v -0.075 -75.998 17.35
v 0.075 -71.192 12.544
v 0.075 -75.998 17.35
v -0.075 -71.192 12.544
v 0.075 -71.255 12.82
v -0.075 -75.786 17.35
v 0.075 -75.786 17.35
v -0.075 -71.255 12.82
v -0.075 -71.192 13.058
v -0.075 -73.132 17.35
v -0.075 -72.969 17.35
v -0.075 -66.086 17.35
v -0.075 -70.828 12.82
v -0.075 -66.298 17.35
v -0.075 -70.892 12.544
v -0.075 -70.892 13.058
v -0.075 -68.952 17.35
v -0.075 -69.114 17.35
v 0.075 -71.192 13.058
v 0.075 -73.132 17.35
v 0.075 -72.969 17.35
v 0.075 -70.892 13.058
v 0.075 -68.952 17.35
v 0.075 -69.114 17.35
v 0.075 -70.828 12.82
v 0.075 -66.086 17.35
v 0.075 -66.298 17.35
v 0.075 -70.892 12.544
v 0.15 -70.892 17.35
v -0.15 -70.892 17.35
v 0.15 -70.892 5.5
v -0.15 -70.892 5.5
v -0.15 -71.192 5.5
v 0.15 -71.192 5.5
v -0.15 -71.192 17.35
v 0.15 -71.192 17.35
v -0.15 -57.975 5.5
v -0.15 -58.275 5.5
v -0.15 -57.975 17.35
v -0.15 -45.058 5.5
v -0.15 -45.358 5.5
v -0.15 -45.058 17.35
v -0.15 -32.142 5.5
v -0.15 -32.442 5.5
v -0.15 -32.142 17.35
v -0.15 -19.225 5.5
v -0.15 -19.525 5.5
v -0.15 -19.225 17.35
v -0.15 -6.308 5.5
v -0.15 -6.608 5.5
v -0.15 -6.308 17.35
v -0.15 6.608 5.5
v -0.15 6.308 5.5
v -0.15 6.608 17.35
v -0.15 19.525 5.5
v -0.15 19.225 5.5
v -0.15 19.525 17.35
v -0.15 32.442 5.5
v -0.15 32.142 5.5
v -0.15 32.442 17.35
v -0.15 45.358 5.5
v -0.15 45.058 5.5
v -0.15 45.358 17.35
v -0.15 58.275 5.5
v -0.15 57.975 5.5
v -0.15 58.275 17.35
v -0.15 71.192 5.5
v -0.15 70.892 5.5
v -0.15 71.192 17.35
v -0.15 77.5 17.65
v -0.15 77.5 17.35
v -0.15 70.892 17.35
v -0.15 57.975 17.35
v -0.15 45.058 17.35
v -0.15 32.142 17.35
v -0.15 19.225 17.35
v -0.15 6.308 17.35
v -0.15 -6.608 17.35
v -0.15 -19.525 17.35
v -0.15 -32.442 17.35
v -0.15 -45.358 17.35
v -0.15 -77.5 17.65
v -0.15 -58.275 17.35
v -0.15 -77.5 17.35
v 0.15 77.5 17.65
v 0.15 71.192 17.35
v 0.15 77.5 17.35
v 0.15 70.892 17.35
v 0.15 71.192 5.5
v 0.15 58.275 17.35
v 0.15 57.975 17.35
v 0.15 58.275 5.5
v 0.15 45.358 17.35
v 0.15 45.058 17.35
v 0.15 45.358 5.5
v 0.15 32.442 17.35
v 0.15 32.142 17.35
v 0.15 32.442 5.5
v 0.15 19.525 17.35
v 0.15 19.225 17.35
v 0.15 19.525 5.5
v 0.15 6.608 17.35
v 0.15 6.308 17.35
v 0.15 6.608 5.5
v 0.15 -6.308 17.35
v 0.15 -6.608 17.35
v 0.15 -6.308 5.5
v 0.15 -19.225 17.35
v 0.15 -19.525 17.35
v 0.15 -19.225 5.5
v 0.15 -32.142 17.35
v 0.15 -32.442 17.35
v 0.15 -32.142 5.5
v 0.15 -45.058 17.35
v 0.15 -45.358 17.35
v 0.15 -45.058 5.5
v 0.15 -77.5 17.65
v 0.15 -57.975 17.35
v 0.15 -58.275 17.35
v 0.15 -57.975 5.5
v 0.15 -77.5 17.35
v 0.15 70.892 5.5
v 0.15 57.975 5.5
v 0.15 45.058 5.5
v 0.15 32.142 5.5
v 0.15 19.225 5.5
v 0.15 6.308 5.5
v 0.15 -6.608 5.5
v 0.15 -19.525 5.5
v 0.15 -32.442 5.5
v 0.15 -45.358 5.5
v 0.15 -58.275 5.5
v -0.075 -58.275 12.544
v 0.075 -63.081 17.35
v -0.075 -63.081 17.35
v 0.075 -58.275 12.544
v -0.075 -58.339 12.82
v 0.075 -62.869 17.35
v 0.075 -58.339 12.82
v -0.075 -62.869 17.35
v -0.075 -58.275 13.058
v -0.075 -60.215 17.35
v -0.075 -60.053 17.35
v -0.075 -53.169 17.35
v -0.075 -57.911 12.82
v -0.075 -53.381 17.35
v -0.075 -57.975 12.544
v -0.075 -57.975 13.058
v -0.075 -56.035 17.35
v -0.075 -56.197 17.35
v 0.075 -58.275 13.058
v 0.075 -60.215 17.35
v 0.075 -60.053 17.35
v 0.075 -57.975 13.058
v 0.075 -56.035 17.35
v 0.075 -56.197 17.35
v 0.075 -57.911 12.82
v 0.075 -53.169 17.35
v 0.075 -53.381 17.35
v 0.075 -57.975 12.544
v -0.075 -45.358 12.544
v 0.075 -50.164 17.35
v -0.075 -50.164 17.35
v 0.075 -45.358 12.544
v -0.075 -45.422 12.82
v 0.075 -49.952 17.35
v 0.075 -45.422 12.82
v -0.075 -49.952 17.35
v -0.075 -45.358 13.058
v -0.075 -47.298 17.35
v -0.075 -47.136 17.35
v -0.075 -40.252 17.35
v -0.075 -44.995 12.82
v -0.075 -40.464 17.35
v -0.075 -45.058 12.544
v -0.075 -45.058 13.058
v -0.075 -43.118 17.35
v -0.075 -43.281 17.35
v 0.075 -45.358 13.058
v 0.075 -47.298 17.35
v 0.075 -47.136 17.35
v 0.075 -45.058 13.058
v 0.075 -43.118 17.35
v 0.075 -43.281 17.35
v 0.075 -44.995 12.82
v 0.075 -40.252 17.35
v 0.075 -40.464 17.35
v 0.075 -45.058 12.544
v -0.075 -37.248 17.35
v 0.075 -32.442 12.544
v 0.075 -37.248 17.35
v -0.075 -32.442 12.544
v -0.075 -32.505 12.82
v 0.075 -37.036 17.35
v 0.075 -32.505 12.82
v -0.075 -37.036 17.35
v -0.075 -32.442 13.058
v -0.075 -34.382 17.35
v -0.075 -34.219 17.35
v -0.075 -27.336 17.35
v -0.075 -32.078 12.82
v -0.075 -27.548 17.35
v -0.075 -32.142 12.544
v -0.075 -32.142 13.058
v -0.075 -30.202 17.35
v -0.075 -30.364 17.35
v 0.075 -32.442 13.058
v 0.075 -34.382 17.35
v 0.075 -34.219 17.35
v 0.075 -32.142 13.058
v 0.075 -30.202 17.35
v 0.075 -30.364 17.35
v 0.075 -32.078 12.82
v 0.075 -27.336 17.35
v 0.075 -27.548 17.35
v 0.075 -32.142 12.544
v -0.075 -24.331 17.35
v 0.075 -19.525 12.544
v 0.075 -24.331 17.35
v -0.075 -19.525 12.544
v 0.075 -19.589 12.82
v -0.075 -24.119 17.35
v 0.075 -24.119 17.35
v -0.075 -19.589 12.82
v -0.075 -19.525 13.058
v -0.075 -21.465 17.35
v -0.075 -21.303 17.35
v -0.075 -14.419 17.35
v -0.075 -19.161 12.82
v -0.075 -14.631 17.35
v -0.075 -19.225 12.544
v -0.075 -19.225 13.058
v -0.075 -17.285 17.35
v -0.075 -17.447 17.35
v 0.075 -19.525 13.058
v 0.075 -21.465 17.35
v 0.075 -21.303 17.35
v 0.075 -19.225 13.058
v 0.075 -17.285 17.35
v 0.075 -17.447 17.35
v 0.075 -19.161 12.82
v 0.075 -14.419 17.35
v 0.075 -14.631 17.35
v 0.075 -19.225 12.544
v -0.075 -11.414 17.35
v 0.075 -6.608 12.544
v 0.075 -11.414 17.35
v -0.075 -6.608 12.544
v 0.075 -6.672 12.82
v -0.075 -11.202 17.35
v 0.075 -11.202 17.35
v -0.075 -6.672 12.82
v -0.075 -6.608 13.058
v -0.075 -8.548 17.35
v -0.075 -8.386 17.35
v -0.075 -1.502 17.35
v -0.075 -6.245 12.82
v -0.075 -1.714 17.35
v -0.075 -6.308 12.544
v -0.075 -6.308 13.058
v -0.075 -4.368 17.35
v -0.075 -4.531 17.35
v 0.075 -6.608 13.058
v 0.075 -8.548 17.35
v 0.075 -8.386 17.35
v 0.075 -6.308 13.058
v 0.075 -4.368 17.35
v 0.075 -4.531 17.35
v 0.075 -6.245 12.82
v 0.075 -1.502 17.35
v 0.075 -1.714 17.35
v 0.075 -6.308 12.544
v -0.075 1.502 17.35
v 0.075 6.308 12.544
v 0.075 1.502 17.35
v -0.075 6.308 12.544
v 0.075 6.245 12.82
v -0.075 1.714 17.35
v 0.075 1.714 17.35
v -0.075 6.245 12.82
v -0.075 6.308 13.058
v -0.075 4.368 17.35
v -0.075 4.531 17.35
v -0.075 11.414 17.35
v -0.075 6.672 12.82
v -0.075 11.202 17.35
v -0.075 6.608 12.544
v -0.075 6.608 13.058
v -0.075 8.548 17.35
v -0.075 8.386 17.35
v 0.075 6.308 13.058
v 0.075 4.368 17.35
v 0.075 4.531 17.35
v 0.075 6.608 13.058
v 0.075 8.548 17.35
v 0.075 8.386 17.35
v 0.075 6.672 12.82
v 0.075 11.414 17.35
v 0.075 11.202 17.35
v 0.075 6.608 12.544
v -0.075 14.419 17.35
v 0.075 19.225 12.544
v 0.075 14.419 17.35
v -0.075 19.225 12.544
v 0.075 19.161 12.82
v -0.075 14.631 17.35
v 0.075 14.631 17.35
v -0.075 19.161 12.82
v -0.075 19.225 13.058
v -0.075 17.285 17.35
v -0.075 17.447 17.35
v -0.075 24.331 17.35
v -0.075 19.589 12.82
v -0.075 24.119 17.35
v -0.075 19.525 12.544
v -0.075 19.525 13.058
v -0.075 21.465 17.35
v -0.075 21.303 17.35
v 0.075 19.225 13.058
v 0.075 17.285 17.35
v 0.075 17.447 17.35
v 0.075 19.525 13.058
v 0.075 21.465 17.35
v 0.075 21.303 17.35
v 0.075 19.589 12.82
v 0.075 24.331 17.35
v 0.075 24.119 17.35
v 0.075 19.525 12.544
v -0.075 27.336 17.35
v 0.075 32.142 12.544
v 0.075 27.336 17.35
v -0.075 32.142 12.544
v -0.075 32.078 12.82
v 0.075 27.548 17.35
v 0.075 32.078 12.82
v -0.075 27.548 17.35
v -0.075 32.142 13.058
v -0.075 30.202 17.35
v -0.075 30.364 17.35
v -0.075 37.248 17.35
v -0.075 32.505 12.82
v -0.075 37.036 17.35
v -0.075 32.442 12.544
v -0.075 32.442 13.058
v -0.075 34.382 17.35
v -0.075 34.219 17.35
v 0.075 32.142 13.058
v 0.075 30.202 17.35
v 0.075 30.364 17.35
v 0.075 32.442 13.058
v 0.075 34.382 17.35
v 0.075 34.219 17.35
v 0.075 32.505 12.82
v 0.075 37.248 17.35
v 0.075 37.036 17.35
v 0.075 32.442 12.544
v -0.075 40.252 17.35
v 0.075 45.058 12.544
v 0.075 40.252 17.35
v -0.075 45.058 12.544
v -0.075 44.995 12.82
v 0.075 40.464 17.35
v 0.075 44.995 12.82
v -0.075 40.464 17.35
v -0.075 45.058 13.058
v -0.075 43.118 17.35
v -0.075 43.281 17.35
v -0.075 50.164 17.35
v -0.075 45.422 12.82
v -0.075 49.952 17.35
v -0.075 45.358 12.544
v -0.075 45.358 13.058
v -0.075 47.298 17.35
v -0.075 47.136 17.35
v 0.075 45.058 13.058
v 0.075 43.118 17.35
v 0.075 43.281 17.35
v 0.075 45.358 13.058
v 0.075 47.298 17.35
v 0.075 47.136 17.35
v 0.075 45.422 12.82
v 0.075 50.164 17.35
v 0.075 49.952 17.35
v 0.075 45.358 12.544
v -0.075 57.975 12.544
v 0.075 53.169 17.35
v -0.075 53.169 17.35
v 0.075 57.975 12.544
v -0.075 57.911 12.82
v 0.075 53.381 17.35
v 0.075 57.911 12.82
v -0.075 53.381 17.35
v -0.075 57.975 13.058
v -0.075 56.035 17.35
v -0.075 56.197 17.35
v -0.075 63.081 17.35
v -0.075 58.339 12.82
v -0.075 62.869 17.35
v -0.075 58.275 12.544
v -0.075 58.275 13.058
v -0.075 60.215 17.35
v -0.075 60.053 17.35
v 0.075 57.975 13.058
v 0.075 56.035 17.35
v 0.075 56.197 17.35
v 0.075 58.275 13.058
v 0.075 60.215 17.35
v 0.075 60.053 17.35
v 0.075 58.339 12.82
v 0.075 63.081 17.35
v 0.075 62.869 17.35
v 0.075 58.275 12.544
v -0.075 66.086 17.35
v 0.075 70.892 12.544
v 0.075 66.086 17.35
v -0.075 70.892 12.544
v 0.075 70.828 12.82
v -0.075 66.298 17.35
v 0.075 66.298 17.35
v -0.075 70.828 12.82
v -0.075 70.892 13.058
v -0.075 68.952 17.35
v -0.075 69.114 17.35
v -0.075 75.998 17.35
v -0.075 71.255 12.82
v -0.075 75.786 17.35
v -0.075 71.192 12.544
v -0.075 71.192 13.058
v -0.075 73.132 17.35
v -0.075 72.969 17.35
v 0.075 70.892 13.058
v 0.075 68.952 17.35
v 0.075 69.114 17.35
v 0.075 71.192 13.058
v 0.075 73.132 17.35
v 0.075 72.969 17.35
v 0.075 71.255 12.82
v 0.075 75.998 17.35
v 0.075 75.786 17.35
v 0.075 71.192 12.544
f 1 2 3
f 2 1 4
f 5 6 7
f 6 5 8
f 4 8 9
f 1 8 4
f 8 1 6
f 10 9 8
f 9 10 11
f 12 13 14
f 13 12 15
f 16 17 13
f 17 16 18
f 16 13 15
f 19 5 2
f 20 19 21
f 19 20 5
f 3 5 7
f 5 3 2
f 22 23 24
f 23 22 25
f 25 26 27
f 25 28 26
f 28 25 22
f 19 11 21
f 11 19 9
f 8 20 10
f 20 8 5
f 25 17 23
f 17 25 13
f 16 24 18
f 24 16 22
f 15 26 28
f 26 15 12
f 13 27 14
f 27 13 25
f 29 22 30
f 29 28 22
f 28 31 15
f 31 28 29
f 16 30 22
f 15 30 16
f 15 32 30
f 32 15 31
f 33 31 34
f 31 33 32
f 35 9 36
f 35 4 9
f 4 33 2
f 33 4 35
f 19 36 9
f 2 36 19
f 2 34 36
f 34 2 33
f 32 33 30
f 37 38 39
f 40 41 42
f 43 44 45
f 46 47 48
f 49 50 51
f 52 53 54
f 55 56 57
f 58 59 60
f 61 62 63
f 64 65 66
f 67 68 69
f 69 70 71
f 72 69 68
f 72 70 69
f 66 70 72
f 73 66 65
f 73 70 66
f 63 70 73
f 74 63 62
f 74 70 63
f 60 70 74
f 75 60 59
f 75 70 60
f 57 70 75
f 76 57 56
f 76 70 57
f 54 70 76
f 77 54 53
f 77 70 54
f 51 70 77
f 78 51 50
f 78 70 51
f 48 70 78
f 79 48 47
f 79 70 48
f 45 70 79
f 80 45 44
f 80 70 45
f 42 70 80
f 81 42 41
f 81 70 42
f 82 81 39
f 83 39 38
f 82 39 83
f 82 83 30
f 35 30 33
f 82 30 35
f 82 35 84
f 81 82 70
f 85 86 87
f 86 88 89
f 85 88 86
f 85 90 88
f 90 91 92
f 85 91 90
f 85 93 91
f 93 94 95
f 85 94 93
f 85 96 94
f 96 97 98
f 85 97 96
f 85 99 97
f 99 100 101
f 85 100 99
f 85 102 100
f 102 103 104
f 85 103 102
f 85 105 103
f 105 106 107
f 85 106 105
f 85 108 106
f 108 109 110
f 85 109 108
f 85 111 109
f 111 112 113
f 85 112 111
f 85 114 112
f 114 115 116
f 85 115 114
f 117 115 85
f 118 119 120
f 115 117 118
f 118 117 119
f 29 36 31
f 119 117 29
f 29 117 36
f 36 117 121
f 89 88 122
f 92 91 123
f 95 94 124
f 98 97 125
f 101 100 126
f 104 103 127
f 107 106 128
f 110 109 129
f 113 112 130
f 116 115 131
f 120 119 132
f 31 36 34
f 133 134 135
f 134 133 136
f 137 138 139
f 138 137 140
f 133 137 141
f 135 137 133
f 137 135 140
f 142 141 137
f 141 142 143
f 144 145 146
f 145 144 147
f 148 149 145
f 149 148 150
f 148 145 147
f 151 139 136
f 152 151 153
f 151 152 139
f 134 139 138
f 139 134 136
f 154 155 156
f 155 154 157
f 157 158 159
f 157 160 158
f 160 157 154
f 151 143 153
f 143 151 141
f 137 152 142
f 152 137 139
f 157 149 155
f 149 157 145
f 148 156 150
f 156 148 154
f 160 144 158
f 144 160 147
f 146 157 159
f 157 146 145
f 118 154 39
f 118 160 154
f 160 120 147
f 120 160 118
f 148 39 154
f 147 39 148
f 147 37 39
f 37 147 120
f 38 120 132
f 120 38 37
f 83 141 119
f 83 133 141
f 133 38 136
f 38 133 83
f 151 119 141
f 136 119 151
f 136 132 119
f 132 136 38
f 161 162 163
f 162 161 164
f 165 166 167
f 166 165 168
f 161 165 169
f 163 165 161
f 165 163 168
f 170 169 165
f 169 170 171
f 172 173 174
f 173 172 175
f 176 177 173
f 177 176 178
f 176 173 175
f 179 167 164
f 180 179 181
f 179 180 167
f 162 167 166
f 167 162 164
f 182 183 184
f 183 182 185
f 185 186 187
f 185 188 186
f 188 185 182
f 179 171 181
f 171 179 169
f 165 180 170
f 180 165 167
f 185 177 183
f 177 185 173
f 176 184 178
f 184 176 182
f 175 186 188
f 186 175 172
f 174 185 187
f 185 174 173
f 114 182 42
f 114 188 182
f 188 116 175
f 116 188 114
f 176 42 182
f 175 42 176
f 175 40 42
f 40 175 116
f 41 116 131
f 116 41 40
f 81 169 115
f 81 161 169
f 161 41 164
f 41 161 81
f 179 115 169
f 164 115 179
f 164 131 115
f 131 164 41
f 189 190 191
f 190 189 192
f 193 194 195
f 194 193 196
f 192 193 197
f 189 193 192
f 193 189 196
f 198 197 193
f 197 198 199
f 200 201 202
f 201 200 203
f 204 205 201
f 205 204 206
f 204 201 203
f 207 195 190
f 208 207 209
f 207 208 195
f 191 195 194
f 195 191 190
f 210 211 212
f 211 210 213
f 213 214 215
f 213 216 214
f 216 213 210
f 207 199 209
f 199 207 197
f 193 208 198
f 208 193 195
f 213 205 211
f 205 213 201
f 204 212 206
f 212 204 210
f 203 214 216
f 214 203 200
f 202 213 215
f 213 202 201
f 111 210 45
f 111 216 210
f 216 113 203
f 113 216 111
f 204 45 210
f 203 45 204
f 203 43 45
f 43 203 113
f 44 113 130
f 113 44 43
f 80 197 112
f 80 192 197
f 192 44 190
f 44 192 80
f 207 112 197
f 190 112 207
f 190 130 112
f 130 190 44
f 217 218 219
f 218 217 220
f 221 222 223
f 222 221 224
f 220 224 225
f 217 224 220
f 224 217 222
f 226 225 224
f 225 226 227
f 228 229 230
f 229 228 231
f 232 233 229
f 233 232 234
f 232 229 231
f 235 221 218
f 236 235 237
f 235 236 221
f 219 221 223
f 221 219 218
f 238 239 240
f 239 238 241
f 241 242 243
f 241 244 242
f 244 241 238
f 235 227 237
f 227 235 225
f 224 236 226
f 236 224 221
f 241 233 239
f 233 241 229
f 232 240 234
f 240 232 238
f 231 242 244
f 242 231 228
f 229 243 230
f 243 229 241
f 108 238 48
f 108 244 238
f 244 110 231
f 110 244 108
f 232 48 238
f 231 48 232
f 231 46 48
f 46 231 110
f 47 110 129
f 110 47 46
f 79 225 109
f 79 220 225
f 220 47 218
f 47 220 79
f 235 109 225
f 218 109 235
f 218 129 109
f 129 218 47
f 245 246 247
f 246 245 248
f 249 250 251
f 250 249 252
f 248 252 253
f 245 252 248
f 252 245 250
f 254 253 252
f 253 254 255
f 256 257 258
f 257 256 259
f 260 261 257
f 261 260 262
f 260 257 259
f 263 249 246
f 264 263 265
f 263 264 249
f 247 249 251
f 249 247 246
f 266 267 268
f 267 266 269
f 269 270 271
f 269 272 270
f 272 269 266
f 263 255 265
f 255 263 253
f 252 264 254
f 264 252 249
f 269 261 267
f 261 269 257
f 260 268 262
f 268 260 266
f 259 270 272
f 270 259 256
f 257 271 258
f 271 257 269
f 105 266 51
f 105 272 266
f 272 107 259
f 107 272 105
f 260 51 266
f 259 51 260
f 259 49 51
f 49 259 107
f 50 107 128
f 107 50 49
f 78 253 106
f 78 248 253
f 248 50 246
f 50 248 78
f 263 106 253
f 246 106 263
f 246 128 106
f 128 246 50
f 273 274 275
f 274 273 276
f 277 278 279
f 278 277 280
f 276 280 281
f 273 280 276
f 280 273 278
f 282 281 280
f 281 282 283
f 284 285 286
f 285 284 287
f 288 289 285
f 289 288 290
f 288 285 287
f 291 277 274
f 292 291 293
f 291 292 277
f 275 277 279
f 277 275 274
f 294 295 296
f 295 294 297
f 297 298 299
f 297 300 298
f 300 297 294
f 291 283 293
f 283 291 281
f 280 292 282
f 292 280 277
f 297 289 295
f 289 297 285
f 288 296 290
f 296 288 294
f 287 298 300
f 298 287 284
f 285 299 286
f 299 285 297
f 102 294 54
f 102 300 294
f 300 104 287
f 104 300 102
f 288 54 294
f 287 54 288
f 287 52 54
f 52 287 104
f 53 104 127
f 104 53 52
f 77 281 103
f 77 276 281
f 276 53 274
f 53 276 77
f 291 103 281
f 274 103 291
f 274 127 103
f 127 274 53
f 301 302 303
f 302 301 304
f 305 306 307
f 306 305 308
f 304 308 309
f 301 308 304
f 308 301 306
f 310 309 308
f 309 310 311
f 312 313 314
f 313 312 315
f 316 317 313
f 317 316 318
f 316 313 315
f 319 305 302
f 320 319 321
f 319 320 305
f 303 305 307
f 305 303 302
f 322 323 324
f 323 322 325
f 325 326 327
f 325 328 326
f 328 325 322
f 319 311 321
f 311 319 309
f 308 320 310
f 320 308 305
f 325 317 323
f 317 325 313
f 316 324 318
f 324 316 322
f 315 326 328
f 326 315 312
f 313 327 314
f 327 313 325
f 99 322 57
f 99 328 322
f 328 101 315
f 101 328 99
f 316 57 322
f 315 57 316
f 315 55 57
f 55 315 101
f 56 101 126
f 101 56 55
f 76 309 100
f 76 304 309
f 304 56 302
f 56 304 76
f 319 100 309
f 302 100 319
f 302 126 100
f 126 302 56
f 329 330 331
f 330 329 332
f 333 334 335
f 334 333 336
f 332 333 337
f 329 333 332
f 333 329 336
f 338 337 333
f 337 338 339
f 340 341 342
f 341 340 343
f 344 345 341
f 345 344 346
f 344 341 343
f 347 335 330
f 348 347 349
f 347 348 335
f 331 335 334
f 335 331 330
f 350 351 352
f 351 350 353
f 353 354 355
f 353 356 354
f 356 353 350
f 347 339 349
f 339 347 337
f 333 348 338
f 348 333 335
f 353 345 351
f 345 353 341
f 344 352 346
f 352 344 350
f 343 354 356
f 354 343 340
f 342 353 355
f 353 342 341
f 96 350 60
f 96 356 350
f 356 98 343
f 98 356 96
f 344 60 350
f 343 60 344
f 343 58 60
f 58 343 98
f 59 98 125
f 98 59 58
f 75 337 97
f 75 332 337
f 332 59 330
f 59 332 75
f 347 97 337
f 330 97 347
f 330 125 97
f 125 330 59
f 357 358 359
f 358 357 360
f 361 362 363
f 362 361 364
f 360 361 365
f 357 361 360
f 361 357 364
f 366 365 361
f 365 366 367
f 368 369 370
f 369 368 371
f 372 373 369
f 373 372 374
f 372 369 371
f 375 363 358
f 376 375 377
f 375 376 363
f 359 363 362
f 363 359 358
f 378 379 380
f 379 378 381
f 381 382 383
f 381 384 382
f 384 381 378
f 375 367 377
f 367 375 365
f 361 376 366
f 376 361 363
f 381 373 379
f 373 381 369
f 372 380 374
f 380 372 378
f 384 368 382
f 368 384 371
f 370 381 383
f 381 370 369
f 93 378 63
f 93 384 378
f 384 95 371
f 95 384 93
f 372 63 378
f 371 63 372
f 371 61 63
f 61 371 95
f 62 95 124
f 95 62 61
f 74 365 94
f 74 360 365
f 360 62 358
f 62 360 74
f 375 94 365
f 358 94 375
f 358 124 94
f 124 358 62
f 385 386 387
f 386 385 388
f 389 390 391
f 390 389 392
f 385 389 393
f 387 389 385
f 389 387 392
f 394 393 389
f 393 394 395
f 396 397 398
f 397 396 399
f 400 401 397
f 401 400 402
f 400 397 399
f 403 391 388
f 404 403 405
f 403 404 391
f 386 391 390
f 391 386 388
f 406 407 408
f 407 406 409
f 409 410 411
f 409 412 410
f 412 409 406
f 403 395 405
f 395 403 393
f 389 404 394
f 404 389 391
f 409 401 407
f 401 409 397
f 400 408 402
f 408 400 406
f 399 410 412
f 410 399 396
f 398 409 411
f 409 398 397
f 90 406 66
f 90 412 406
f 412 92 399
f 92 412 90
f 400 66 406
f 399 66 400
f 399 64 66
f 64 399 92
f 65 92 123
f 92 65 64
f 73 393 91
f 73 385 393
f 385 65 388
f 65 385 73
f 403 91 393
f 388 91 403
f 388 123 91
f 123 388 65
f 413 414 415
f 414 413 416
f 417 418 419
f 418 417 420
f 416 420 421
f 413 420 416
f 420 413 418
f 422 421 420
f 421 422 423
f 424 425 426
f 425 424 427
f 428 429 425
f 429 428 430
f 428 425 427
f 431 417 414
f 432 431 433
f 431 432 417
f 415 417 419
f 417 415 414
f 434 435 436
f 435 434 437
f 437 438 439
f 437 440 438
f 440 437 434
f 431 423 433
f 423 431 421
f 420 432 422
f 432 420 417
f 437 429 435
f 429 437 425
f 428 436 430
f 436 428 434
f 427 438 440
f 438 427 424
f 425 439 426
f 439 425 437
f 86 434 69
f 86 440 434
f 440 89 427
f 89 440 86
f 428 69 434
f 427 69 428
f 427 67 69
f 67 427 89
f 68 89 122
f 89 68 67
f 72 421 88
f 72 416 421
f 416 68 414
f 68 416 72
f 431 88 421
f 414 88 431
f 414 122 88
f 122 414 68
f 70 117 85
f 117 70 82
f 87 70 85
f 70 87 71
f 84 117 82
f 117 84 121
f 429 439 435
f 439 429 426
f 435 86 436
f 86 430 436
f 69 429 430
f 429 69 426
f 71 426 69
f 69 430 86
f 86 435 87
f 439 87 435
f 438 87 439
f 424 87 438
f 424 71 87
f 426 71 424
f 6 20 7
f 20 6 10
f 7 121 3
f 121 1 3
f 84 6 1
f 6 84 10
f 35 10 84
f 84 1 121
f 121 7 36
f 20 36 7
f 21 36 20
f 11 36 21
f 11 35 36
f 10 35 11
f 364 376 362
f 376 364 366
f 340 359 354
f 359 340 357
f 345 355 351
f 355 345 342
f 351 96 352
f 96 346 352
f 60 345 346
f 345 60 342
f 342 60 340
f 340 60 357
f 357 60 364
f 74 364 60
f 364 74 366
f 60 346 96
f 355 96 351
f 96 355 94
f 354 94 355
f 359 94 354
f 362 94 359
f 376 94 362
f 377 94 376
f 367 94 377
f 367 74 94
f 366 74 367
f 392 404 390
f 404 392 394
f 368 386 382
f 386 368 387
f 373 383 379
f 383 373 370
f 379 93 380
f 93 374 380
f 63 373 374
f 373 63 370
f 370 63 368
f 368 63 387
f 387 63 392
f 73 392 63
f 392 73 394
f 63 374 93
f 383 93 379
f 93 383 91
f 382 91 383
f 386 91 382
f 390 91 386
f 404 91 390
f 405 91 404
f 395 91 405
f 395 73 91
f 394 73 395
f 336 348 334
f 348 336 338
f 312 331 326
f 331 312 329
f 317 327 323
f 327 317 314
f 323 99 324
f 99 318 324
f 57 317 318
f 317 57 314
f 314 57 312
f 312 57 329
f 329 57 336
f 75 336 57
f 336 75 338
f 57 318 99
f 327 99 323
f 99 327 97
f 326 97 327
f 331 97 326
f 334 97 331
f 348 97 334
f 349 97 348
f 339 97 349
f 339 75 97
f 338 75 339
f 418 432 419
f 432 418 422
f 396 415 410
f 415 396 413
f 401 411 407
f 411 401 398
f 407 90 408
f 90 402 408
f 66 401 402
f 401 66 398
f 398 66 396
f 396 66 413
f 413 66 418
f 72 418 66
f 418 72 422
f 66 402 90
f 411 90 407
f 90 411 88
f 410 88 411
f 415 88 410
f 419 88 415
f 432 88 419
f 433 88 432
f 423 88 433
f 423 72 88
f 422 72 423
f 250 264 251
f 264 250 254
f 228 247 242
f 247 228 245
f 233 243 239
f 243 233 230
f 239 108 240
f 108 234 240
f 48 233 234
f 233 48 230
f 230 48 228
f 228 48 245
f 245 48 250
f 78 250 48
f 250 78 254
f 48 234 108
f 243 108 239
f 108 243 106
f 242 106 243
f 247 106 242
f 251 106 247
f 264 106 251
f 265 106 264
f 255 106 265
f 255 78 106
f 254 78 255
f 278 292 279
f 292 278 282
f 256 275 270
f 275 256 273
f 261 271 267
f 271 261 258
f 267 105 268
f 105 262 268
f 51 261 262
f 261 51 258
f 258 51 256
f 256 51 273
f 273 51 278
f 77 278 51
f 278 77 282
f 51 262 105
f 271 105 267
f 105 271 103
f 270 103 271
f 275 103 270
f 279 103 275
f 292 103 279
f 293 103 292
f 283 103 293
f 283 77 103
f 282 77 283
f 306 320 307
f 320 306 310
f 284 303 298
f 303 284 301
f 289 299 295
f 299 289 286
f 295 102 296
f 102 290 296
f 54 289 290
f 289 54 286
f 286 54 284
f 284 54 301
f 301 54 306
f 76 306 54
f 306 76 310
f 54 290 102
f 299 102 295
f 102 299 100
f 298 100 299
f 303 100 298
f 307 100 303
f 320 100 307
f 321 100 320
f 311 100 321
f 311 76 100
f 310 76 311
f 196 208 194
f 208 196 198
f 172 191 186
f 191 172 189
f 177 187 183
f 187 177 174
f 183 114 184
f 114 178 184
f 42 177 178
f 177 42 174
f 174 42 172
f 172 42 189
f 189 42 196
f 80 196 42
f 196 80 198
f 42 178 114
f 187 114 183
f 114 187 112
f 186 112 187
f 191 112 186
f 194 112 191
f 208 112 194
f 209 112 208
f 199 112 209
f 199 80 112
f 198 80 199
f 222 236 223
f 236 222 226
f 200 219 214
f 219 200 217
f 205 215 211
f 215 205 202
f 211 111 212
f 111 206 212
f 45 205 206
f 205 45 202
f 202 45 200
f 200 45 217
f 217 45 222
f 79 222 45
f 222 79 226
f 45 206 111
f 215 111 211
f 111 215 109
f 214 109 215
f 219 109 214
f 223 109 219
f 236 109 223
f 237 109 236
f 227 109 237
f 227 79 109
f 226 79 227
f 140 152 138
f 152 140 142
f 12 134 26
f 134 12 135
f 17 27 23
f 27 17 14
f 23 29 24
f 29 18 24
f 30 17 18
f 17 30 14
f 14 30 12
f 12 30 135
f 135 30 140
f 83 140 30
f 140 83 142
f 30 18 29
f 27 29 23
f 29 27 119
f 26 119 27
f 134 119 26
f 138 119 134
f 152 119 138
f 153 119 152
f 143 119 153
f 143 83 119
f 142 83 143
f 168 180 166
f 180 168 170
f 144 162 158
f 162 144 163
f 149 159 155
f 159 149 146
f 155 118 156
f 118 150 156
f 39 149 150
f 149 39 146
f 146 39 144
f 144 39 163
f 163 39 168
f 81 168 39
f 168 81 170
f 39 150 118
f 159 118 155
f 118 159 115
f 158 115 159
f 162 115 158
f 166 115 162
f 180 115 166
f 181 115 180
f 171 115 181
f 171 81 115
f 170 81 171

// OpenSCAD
/*
  Create rows of tension columns for the 570 hab.
  (Quick and dirty version)
  
  OpenSCAD source code.
  
  File units are meters
*/
OD=0.3;
ht=12;
run=155; // meters down the rows of mattress columns
count=12;
spacing=run/count; // distance between columns

fan_len=5; // top fans out this far below the top
nfan=4; // number of fanned supports
fan=45; fan_spacing=45/(nfan/2);
fOD=OD/sqrt(nfan);

bollard=0.5; // vehicle bollard
bollard_ht=3;

module positioning() {
    rotate([0,0,90]) // go down Y axis
    translate([-run/2+spacing/2,0,5.5]) // centeraxis
       children();
}

module foreach_column() {
    positioning()
    for (x=[0:spacing:run-spacing/2])
        translate([x,0,0])
            children();
}

module supports() {
    // Top solid part
    positioning()
    translate([-spacing/2,-OD/2,ht-OD/2]) cube([run,OD,OD]);

    foreach_column()
    {
        translate([-OD/2,-OD/2,0])
            cube([OD,OD,ht]);
        translate([0,0,ht-fan_len])
        for (angle=[-fan:fan_spacing:+fan])
            if (angle!=0) rotate([0,angle,0])
                translate([-fOD/2,-fOD/2,0])
                cube([fOD,fOD,fan_len/cos(angle)]);
    }
}

module bollards() {
    foreach_column()
        translate([-bollard/2,-bollard/2,0])
            cube([bollard,bollard,bollard_ht]);
}

//bollards();
supports();
